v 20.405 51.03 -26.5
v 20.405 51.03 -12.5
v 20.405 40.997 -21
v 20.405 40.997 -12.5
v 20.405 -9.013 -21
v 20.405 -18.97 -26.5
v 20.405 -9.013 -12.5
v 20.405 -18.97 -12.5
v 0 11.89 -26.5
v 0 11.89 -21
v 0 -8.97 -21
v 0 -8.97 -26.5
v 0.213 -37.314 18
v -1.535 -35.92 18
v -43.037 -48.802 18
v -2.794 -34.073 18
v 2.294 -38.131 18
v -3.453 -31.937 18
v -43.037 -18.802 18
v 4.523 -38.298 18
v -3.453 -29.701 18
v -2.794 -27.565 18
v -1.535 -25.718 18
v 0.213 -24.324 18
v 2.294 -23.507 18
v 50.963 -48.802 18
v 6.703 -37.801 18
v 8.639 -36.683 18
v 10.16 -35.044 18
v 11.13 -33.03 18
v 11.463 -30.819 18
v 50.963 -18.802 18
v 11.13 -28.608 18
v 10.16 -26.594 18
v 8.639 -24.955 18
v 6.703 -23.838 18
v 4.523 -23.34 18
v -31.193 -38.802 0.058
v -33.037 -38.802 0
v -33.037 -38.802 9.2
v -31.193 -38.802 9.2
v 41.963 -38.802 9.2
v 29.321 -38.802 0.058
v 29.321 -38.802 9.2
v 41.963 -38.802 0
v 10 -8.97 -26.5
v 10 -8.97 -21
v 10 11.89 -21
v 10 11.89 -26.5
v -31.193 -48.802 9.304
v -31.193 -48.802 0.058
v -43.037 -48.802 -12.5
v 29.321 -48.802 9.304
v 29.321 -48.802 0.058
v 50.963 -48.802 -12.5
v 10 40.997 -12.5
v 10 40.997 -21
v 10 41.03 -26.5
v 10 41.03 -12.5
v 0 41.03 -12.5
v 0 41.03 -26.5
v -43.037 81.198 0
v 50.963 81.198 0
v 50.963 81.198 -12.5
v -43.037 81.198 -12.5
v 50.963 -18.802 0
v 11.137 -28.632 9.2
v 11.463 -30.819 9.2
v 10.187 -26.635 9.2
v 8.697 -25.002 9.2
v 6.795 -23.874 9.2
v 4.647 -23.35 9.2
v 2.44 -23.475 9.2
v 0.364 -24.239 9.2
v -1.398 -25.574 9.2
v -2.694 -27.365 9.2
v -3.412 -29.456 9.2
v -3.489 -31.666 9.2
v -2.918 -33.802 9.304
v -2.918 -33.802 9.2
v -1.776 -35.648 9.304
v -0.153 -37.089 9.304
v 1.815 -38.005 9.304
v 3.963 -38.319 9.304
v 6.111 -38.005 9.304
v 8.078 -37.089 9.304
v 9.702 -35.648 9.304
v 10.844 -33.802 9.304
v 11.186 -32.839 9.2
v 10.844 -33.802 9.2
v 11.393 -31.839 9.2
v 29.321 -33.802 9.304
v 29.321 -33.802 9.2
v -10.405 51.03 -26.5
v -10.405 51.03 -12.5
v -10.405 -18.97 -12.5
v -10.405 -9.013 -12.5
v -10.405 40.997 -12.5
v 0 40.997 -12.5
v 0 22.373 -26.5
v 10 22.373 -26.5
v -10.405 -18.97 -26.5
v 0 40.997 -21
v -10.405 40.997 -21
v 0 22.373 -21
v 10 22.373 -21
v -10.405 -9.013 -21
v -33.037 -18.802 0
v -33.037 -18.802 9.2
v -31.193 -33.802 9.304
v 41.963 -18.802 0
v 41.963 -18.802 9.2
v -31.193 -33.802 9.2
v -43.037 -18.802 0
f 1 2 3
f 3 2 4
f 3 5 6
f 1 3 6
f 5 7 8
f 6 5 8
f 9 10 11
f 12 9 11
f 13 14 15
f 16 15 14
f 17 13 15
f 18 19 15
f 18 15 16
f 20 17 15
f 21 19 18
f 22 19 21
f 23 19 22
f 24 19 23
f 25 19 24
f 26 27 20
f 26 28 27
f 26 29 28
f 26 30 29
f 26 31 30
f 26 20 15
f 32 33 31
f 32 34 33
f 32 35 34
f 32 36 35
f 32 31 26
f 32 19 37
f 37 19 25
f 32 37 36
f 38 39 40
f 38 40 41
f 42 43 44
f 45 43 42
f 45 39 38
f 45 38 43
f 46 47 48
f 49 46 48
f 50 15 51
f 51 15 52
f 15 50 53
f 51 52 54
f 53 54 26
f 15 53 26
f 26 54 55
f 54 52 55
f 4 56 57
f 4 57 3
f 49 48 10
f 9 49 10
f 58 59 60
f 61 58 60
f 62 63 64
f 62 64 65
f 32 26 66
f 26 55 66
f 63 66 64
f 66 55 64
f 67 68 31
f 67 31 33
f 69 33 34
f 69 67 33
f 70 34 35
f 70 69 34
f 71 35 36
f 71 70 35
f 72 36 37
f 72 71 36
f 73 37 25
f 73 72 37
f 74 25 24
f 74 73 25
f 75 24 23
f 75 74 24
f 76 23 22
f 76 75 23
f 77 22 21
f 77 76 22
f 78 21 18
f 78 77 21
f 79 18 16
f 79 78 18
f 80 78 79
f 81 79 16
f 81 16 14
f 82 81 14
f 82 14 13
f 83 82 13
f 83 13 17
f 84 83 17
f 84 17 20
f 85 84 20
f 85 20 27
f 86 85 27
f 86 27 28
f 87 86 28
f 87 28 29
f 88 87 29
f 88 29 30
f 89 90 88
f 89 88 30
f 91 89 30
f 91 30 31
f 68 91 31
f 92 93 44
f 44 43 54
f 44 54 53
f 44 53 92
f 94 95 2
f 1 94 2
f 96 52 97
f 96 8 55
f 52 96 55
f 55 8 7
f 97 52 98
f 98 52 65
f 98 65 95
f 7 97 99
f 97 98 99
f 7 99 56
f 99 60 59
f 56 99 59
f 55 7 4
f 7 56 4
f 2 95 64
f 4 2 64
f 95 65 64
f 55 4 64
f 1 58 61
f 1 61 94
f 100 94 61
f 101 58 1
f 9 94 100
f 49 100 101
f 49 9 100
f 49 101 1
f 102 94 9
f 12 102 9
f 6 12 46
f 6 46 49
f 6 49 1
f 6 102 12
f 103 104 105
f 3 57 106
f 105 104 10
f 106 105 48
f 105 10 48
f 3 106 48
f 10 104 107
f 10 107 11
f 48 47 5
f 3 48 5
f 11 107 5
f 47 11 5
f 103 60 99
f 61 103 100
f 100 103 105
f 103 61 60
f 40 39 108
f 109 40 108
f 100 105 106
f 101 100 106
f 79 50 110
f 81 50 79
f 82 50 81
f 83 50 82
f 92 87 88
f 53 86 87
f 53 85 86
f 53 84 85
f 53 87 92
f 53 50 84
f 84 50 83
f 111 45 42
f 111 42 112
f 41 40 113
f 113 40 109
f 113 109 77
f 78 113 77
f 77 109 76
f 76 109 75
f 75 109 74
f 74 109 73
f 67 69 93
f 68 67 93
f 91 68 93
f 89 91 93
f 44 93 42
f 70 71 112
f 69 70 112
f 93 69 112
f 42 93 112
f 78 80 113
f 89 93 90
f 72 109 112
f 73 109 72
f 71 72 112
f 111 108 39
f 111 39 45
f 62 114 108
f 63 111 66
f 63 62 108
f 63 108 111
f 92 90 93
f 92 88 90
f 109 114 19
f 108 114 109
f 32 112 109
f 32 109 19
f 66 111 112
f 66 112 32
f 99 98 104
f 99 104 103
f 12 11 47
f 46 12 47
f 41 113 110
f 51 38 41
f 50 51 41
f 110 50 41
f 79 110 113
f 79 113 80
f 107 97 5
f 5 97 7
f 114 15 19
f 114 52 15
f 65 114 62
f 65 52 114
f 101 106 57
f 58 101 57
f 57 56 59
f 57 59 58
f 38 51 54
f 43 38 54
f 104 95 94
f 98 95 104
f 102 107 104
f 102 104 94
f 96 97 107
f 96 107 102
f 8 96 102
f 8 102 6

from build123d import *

# Parameters (mm, degrees)
F2_DEPTH  = 12.5
F3_W      = 94
F3_H      = 30
F3_R      = 7.5
F4_DEPTH  = 18
F0_W      = 75
F0_H      = 20
F5_DEPTH  = 9.2
F6_W      = 30.81081
F6_H      = 70
F7_DEPTH  = 14
F8_W      = 35
F8_H      = 50.010137
F9_DEPTH  = 8.5
F10_W     = 60.514386
F10_H     = 9.2464
F11_DEPTH = 15


with BuildPart() as f2:
    # F1 (on Top) → F2 (new body)
    with BuildSketch(Plane.XY):
        Polygon((50.962807, 81.197856), (-43.037193, 81.197856), (-43.037193, 16.197856), (-43.037193, 11.091857), (-43.037193, -48.802144), (50.962807, -48.802144), align=None)
    extrude(amount=-F2_DEPTH)

    # F3 (on face) → F4 (join)
    with BuildSketch(Plane.XY):
        with Locations((3.962807, -33.802144)):
            Rectangle(F3_W, F3_H)
        with Locations((3.962807, -30.819066)):
            Circle(F3_R, mode=Mode.SUBTRACT)
    extrude(amount=F4_DEPTH)

    # F0 (on Top) → F5 (cut)
    with BuildSketch(Plane.XY):
        with Locations((4.462807, -28.802144)):
            Rectangle(F0_W, F0_H)
    extrude(amount=F5_DEPTH, mode=Mode.SUBTRACT)

    # F6 (on face) → F7 (join)
    with BuildSketch(Plane(origin=(0, 0, -12.5), x_dir=(1, 0, 0), z_dir=(0, 0, -1))):
        with Locations((5, -16.029622)):
            Rectangle(F6_W, F6_H)
        Polygon((10, -41.029622), (5, -41.029622), (0, -41.029622), (0, -22.373011), (10, -22.373011), align=None, mode=Mode.SUBTRACT)
        Polygon((0, 8.970378), (5, 8.970378), (10, 8.970378), (10, -11.889663), (0, -11.889663), align=None, mode=Mode.SUBTRACT)
    extrude(amount=F7_DEPTH)

    # F8 (on face) → F9 (cut)
    with BuildSketch(Plane(origin=(0, 0, -12.5), x_dir=(1, 0, 0), z_dir=(0, 0, -1))):
        with Locations((2.905405, -15.991903)):
            Rectangle(F8_W, F8_H)
    extrude(amount=F9_DEPTH, mode=Mode.SUBTRACT)

    # F10 (on face) → F11 (cut)
    with BuildSketch(Plane.XZ.offset(48.802144)):
        with Locations((-0.93579, 4.68071)):
            Rectangle(F10_W, F10_H)
    extrude(amount=-F11_DEPTH, mode=Mode.SUBTRACT)


solid = f2.part
